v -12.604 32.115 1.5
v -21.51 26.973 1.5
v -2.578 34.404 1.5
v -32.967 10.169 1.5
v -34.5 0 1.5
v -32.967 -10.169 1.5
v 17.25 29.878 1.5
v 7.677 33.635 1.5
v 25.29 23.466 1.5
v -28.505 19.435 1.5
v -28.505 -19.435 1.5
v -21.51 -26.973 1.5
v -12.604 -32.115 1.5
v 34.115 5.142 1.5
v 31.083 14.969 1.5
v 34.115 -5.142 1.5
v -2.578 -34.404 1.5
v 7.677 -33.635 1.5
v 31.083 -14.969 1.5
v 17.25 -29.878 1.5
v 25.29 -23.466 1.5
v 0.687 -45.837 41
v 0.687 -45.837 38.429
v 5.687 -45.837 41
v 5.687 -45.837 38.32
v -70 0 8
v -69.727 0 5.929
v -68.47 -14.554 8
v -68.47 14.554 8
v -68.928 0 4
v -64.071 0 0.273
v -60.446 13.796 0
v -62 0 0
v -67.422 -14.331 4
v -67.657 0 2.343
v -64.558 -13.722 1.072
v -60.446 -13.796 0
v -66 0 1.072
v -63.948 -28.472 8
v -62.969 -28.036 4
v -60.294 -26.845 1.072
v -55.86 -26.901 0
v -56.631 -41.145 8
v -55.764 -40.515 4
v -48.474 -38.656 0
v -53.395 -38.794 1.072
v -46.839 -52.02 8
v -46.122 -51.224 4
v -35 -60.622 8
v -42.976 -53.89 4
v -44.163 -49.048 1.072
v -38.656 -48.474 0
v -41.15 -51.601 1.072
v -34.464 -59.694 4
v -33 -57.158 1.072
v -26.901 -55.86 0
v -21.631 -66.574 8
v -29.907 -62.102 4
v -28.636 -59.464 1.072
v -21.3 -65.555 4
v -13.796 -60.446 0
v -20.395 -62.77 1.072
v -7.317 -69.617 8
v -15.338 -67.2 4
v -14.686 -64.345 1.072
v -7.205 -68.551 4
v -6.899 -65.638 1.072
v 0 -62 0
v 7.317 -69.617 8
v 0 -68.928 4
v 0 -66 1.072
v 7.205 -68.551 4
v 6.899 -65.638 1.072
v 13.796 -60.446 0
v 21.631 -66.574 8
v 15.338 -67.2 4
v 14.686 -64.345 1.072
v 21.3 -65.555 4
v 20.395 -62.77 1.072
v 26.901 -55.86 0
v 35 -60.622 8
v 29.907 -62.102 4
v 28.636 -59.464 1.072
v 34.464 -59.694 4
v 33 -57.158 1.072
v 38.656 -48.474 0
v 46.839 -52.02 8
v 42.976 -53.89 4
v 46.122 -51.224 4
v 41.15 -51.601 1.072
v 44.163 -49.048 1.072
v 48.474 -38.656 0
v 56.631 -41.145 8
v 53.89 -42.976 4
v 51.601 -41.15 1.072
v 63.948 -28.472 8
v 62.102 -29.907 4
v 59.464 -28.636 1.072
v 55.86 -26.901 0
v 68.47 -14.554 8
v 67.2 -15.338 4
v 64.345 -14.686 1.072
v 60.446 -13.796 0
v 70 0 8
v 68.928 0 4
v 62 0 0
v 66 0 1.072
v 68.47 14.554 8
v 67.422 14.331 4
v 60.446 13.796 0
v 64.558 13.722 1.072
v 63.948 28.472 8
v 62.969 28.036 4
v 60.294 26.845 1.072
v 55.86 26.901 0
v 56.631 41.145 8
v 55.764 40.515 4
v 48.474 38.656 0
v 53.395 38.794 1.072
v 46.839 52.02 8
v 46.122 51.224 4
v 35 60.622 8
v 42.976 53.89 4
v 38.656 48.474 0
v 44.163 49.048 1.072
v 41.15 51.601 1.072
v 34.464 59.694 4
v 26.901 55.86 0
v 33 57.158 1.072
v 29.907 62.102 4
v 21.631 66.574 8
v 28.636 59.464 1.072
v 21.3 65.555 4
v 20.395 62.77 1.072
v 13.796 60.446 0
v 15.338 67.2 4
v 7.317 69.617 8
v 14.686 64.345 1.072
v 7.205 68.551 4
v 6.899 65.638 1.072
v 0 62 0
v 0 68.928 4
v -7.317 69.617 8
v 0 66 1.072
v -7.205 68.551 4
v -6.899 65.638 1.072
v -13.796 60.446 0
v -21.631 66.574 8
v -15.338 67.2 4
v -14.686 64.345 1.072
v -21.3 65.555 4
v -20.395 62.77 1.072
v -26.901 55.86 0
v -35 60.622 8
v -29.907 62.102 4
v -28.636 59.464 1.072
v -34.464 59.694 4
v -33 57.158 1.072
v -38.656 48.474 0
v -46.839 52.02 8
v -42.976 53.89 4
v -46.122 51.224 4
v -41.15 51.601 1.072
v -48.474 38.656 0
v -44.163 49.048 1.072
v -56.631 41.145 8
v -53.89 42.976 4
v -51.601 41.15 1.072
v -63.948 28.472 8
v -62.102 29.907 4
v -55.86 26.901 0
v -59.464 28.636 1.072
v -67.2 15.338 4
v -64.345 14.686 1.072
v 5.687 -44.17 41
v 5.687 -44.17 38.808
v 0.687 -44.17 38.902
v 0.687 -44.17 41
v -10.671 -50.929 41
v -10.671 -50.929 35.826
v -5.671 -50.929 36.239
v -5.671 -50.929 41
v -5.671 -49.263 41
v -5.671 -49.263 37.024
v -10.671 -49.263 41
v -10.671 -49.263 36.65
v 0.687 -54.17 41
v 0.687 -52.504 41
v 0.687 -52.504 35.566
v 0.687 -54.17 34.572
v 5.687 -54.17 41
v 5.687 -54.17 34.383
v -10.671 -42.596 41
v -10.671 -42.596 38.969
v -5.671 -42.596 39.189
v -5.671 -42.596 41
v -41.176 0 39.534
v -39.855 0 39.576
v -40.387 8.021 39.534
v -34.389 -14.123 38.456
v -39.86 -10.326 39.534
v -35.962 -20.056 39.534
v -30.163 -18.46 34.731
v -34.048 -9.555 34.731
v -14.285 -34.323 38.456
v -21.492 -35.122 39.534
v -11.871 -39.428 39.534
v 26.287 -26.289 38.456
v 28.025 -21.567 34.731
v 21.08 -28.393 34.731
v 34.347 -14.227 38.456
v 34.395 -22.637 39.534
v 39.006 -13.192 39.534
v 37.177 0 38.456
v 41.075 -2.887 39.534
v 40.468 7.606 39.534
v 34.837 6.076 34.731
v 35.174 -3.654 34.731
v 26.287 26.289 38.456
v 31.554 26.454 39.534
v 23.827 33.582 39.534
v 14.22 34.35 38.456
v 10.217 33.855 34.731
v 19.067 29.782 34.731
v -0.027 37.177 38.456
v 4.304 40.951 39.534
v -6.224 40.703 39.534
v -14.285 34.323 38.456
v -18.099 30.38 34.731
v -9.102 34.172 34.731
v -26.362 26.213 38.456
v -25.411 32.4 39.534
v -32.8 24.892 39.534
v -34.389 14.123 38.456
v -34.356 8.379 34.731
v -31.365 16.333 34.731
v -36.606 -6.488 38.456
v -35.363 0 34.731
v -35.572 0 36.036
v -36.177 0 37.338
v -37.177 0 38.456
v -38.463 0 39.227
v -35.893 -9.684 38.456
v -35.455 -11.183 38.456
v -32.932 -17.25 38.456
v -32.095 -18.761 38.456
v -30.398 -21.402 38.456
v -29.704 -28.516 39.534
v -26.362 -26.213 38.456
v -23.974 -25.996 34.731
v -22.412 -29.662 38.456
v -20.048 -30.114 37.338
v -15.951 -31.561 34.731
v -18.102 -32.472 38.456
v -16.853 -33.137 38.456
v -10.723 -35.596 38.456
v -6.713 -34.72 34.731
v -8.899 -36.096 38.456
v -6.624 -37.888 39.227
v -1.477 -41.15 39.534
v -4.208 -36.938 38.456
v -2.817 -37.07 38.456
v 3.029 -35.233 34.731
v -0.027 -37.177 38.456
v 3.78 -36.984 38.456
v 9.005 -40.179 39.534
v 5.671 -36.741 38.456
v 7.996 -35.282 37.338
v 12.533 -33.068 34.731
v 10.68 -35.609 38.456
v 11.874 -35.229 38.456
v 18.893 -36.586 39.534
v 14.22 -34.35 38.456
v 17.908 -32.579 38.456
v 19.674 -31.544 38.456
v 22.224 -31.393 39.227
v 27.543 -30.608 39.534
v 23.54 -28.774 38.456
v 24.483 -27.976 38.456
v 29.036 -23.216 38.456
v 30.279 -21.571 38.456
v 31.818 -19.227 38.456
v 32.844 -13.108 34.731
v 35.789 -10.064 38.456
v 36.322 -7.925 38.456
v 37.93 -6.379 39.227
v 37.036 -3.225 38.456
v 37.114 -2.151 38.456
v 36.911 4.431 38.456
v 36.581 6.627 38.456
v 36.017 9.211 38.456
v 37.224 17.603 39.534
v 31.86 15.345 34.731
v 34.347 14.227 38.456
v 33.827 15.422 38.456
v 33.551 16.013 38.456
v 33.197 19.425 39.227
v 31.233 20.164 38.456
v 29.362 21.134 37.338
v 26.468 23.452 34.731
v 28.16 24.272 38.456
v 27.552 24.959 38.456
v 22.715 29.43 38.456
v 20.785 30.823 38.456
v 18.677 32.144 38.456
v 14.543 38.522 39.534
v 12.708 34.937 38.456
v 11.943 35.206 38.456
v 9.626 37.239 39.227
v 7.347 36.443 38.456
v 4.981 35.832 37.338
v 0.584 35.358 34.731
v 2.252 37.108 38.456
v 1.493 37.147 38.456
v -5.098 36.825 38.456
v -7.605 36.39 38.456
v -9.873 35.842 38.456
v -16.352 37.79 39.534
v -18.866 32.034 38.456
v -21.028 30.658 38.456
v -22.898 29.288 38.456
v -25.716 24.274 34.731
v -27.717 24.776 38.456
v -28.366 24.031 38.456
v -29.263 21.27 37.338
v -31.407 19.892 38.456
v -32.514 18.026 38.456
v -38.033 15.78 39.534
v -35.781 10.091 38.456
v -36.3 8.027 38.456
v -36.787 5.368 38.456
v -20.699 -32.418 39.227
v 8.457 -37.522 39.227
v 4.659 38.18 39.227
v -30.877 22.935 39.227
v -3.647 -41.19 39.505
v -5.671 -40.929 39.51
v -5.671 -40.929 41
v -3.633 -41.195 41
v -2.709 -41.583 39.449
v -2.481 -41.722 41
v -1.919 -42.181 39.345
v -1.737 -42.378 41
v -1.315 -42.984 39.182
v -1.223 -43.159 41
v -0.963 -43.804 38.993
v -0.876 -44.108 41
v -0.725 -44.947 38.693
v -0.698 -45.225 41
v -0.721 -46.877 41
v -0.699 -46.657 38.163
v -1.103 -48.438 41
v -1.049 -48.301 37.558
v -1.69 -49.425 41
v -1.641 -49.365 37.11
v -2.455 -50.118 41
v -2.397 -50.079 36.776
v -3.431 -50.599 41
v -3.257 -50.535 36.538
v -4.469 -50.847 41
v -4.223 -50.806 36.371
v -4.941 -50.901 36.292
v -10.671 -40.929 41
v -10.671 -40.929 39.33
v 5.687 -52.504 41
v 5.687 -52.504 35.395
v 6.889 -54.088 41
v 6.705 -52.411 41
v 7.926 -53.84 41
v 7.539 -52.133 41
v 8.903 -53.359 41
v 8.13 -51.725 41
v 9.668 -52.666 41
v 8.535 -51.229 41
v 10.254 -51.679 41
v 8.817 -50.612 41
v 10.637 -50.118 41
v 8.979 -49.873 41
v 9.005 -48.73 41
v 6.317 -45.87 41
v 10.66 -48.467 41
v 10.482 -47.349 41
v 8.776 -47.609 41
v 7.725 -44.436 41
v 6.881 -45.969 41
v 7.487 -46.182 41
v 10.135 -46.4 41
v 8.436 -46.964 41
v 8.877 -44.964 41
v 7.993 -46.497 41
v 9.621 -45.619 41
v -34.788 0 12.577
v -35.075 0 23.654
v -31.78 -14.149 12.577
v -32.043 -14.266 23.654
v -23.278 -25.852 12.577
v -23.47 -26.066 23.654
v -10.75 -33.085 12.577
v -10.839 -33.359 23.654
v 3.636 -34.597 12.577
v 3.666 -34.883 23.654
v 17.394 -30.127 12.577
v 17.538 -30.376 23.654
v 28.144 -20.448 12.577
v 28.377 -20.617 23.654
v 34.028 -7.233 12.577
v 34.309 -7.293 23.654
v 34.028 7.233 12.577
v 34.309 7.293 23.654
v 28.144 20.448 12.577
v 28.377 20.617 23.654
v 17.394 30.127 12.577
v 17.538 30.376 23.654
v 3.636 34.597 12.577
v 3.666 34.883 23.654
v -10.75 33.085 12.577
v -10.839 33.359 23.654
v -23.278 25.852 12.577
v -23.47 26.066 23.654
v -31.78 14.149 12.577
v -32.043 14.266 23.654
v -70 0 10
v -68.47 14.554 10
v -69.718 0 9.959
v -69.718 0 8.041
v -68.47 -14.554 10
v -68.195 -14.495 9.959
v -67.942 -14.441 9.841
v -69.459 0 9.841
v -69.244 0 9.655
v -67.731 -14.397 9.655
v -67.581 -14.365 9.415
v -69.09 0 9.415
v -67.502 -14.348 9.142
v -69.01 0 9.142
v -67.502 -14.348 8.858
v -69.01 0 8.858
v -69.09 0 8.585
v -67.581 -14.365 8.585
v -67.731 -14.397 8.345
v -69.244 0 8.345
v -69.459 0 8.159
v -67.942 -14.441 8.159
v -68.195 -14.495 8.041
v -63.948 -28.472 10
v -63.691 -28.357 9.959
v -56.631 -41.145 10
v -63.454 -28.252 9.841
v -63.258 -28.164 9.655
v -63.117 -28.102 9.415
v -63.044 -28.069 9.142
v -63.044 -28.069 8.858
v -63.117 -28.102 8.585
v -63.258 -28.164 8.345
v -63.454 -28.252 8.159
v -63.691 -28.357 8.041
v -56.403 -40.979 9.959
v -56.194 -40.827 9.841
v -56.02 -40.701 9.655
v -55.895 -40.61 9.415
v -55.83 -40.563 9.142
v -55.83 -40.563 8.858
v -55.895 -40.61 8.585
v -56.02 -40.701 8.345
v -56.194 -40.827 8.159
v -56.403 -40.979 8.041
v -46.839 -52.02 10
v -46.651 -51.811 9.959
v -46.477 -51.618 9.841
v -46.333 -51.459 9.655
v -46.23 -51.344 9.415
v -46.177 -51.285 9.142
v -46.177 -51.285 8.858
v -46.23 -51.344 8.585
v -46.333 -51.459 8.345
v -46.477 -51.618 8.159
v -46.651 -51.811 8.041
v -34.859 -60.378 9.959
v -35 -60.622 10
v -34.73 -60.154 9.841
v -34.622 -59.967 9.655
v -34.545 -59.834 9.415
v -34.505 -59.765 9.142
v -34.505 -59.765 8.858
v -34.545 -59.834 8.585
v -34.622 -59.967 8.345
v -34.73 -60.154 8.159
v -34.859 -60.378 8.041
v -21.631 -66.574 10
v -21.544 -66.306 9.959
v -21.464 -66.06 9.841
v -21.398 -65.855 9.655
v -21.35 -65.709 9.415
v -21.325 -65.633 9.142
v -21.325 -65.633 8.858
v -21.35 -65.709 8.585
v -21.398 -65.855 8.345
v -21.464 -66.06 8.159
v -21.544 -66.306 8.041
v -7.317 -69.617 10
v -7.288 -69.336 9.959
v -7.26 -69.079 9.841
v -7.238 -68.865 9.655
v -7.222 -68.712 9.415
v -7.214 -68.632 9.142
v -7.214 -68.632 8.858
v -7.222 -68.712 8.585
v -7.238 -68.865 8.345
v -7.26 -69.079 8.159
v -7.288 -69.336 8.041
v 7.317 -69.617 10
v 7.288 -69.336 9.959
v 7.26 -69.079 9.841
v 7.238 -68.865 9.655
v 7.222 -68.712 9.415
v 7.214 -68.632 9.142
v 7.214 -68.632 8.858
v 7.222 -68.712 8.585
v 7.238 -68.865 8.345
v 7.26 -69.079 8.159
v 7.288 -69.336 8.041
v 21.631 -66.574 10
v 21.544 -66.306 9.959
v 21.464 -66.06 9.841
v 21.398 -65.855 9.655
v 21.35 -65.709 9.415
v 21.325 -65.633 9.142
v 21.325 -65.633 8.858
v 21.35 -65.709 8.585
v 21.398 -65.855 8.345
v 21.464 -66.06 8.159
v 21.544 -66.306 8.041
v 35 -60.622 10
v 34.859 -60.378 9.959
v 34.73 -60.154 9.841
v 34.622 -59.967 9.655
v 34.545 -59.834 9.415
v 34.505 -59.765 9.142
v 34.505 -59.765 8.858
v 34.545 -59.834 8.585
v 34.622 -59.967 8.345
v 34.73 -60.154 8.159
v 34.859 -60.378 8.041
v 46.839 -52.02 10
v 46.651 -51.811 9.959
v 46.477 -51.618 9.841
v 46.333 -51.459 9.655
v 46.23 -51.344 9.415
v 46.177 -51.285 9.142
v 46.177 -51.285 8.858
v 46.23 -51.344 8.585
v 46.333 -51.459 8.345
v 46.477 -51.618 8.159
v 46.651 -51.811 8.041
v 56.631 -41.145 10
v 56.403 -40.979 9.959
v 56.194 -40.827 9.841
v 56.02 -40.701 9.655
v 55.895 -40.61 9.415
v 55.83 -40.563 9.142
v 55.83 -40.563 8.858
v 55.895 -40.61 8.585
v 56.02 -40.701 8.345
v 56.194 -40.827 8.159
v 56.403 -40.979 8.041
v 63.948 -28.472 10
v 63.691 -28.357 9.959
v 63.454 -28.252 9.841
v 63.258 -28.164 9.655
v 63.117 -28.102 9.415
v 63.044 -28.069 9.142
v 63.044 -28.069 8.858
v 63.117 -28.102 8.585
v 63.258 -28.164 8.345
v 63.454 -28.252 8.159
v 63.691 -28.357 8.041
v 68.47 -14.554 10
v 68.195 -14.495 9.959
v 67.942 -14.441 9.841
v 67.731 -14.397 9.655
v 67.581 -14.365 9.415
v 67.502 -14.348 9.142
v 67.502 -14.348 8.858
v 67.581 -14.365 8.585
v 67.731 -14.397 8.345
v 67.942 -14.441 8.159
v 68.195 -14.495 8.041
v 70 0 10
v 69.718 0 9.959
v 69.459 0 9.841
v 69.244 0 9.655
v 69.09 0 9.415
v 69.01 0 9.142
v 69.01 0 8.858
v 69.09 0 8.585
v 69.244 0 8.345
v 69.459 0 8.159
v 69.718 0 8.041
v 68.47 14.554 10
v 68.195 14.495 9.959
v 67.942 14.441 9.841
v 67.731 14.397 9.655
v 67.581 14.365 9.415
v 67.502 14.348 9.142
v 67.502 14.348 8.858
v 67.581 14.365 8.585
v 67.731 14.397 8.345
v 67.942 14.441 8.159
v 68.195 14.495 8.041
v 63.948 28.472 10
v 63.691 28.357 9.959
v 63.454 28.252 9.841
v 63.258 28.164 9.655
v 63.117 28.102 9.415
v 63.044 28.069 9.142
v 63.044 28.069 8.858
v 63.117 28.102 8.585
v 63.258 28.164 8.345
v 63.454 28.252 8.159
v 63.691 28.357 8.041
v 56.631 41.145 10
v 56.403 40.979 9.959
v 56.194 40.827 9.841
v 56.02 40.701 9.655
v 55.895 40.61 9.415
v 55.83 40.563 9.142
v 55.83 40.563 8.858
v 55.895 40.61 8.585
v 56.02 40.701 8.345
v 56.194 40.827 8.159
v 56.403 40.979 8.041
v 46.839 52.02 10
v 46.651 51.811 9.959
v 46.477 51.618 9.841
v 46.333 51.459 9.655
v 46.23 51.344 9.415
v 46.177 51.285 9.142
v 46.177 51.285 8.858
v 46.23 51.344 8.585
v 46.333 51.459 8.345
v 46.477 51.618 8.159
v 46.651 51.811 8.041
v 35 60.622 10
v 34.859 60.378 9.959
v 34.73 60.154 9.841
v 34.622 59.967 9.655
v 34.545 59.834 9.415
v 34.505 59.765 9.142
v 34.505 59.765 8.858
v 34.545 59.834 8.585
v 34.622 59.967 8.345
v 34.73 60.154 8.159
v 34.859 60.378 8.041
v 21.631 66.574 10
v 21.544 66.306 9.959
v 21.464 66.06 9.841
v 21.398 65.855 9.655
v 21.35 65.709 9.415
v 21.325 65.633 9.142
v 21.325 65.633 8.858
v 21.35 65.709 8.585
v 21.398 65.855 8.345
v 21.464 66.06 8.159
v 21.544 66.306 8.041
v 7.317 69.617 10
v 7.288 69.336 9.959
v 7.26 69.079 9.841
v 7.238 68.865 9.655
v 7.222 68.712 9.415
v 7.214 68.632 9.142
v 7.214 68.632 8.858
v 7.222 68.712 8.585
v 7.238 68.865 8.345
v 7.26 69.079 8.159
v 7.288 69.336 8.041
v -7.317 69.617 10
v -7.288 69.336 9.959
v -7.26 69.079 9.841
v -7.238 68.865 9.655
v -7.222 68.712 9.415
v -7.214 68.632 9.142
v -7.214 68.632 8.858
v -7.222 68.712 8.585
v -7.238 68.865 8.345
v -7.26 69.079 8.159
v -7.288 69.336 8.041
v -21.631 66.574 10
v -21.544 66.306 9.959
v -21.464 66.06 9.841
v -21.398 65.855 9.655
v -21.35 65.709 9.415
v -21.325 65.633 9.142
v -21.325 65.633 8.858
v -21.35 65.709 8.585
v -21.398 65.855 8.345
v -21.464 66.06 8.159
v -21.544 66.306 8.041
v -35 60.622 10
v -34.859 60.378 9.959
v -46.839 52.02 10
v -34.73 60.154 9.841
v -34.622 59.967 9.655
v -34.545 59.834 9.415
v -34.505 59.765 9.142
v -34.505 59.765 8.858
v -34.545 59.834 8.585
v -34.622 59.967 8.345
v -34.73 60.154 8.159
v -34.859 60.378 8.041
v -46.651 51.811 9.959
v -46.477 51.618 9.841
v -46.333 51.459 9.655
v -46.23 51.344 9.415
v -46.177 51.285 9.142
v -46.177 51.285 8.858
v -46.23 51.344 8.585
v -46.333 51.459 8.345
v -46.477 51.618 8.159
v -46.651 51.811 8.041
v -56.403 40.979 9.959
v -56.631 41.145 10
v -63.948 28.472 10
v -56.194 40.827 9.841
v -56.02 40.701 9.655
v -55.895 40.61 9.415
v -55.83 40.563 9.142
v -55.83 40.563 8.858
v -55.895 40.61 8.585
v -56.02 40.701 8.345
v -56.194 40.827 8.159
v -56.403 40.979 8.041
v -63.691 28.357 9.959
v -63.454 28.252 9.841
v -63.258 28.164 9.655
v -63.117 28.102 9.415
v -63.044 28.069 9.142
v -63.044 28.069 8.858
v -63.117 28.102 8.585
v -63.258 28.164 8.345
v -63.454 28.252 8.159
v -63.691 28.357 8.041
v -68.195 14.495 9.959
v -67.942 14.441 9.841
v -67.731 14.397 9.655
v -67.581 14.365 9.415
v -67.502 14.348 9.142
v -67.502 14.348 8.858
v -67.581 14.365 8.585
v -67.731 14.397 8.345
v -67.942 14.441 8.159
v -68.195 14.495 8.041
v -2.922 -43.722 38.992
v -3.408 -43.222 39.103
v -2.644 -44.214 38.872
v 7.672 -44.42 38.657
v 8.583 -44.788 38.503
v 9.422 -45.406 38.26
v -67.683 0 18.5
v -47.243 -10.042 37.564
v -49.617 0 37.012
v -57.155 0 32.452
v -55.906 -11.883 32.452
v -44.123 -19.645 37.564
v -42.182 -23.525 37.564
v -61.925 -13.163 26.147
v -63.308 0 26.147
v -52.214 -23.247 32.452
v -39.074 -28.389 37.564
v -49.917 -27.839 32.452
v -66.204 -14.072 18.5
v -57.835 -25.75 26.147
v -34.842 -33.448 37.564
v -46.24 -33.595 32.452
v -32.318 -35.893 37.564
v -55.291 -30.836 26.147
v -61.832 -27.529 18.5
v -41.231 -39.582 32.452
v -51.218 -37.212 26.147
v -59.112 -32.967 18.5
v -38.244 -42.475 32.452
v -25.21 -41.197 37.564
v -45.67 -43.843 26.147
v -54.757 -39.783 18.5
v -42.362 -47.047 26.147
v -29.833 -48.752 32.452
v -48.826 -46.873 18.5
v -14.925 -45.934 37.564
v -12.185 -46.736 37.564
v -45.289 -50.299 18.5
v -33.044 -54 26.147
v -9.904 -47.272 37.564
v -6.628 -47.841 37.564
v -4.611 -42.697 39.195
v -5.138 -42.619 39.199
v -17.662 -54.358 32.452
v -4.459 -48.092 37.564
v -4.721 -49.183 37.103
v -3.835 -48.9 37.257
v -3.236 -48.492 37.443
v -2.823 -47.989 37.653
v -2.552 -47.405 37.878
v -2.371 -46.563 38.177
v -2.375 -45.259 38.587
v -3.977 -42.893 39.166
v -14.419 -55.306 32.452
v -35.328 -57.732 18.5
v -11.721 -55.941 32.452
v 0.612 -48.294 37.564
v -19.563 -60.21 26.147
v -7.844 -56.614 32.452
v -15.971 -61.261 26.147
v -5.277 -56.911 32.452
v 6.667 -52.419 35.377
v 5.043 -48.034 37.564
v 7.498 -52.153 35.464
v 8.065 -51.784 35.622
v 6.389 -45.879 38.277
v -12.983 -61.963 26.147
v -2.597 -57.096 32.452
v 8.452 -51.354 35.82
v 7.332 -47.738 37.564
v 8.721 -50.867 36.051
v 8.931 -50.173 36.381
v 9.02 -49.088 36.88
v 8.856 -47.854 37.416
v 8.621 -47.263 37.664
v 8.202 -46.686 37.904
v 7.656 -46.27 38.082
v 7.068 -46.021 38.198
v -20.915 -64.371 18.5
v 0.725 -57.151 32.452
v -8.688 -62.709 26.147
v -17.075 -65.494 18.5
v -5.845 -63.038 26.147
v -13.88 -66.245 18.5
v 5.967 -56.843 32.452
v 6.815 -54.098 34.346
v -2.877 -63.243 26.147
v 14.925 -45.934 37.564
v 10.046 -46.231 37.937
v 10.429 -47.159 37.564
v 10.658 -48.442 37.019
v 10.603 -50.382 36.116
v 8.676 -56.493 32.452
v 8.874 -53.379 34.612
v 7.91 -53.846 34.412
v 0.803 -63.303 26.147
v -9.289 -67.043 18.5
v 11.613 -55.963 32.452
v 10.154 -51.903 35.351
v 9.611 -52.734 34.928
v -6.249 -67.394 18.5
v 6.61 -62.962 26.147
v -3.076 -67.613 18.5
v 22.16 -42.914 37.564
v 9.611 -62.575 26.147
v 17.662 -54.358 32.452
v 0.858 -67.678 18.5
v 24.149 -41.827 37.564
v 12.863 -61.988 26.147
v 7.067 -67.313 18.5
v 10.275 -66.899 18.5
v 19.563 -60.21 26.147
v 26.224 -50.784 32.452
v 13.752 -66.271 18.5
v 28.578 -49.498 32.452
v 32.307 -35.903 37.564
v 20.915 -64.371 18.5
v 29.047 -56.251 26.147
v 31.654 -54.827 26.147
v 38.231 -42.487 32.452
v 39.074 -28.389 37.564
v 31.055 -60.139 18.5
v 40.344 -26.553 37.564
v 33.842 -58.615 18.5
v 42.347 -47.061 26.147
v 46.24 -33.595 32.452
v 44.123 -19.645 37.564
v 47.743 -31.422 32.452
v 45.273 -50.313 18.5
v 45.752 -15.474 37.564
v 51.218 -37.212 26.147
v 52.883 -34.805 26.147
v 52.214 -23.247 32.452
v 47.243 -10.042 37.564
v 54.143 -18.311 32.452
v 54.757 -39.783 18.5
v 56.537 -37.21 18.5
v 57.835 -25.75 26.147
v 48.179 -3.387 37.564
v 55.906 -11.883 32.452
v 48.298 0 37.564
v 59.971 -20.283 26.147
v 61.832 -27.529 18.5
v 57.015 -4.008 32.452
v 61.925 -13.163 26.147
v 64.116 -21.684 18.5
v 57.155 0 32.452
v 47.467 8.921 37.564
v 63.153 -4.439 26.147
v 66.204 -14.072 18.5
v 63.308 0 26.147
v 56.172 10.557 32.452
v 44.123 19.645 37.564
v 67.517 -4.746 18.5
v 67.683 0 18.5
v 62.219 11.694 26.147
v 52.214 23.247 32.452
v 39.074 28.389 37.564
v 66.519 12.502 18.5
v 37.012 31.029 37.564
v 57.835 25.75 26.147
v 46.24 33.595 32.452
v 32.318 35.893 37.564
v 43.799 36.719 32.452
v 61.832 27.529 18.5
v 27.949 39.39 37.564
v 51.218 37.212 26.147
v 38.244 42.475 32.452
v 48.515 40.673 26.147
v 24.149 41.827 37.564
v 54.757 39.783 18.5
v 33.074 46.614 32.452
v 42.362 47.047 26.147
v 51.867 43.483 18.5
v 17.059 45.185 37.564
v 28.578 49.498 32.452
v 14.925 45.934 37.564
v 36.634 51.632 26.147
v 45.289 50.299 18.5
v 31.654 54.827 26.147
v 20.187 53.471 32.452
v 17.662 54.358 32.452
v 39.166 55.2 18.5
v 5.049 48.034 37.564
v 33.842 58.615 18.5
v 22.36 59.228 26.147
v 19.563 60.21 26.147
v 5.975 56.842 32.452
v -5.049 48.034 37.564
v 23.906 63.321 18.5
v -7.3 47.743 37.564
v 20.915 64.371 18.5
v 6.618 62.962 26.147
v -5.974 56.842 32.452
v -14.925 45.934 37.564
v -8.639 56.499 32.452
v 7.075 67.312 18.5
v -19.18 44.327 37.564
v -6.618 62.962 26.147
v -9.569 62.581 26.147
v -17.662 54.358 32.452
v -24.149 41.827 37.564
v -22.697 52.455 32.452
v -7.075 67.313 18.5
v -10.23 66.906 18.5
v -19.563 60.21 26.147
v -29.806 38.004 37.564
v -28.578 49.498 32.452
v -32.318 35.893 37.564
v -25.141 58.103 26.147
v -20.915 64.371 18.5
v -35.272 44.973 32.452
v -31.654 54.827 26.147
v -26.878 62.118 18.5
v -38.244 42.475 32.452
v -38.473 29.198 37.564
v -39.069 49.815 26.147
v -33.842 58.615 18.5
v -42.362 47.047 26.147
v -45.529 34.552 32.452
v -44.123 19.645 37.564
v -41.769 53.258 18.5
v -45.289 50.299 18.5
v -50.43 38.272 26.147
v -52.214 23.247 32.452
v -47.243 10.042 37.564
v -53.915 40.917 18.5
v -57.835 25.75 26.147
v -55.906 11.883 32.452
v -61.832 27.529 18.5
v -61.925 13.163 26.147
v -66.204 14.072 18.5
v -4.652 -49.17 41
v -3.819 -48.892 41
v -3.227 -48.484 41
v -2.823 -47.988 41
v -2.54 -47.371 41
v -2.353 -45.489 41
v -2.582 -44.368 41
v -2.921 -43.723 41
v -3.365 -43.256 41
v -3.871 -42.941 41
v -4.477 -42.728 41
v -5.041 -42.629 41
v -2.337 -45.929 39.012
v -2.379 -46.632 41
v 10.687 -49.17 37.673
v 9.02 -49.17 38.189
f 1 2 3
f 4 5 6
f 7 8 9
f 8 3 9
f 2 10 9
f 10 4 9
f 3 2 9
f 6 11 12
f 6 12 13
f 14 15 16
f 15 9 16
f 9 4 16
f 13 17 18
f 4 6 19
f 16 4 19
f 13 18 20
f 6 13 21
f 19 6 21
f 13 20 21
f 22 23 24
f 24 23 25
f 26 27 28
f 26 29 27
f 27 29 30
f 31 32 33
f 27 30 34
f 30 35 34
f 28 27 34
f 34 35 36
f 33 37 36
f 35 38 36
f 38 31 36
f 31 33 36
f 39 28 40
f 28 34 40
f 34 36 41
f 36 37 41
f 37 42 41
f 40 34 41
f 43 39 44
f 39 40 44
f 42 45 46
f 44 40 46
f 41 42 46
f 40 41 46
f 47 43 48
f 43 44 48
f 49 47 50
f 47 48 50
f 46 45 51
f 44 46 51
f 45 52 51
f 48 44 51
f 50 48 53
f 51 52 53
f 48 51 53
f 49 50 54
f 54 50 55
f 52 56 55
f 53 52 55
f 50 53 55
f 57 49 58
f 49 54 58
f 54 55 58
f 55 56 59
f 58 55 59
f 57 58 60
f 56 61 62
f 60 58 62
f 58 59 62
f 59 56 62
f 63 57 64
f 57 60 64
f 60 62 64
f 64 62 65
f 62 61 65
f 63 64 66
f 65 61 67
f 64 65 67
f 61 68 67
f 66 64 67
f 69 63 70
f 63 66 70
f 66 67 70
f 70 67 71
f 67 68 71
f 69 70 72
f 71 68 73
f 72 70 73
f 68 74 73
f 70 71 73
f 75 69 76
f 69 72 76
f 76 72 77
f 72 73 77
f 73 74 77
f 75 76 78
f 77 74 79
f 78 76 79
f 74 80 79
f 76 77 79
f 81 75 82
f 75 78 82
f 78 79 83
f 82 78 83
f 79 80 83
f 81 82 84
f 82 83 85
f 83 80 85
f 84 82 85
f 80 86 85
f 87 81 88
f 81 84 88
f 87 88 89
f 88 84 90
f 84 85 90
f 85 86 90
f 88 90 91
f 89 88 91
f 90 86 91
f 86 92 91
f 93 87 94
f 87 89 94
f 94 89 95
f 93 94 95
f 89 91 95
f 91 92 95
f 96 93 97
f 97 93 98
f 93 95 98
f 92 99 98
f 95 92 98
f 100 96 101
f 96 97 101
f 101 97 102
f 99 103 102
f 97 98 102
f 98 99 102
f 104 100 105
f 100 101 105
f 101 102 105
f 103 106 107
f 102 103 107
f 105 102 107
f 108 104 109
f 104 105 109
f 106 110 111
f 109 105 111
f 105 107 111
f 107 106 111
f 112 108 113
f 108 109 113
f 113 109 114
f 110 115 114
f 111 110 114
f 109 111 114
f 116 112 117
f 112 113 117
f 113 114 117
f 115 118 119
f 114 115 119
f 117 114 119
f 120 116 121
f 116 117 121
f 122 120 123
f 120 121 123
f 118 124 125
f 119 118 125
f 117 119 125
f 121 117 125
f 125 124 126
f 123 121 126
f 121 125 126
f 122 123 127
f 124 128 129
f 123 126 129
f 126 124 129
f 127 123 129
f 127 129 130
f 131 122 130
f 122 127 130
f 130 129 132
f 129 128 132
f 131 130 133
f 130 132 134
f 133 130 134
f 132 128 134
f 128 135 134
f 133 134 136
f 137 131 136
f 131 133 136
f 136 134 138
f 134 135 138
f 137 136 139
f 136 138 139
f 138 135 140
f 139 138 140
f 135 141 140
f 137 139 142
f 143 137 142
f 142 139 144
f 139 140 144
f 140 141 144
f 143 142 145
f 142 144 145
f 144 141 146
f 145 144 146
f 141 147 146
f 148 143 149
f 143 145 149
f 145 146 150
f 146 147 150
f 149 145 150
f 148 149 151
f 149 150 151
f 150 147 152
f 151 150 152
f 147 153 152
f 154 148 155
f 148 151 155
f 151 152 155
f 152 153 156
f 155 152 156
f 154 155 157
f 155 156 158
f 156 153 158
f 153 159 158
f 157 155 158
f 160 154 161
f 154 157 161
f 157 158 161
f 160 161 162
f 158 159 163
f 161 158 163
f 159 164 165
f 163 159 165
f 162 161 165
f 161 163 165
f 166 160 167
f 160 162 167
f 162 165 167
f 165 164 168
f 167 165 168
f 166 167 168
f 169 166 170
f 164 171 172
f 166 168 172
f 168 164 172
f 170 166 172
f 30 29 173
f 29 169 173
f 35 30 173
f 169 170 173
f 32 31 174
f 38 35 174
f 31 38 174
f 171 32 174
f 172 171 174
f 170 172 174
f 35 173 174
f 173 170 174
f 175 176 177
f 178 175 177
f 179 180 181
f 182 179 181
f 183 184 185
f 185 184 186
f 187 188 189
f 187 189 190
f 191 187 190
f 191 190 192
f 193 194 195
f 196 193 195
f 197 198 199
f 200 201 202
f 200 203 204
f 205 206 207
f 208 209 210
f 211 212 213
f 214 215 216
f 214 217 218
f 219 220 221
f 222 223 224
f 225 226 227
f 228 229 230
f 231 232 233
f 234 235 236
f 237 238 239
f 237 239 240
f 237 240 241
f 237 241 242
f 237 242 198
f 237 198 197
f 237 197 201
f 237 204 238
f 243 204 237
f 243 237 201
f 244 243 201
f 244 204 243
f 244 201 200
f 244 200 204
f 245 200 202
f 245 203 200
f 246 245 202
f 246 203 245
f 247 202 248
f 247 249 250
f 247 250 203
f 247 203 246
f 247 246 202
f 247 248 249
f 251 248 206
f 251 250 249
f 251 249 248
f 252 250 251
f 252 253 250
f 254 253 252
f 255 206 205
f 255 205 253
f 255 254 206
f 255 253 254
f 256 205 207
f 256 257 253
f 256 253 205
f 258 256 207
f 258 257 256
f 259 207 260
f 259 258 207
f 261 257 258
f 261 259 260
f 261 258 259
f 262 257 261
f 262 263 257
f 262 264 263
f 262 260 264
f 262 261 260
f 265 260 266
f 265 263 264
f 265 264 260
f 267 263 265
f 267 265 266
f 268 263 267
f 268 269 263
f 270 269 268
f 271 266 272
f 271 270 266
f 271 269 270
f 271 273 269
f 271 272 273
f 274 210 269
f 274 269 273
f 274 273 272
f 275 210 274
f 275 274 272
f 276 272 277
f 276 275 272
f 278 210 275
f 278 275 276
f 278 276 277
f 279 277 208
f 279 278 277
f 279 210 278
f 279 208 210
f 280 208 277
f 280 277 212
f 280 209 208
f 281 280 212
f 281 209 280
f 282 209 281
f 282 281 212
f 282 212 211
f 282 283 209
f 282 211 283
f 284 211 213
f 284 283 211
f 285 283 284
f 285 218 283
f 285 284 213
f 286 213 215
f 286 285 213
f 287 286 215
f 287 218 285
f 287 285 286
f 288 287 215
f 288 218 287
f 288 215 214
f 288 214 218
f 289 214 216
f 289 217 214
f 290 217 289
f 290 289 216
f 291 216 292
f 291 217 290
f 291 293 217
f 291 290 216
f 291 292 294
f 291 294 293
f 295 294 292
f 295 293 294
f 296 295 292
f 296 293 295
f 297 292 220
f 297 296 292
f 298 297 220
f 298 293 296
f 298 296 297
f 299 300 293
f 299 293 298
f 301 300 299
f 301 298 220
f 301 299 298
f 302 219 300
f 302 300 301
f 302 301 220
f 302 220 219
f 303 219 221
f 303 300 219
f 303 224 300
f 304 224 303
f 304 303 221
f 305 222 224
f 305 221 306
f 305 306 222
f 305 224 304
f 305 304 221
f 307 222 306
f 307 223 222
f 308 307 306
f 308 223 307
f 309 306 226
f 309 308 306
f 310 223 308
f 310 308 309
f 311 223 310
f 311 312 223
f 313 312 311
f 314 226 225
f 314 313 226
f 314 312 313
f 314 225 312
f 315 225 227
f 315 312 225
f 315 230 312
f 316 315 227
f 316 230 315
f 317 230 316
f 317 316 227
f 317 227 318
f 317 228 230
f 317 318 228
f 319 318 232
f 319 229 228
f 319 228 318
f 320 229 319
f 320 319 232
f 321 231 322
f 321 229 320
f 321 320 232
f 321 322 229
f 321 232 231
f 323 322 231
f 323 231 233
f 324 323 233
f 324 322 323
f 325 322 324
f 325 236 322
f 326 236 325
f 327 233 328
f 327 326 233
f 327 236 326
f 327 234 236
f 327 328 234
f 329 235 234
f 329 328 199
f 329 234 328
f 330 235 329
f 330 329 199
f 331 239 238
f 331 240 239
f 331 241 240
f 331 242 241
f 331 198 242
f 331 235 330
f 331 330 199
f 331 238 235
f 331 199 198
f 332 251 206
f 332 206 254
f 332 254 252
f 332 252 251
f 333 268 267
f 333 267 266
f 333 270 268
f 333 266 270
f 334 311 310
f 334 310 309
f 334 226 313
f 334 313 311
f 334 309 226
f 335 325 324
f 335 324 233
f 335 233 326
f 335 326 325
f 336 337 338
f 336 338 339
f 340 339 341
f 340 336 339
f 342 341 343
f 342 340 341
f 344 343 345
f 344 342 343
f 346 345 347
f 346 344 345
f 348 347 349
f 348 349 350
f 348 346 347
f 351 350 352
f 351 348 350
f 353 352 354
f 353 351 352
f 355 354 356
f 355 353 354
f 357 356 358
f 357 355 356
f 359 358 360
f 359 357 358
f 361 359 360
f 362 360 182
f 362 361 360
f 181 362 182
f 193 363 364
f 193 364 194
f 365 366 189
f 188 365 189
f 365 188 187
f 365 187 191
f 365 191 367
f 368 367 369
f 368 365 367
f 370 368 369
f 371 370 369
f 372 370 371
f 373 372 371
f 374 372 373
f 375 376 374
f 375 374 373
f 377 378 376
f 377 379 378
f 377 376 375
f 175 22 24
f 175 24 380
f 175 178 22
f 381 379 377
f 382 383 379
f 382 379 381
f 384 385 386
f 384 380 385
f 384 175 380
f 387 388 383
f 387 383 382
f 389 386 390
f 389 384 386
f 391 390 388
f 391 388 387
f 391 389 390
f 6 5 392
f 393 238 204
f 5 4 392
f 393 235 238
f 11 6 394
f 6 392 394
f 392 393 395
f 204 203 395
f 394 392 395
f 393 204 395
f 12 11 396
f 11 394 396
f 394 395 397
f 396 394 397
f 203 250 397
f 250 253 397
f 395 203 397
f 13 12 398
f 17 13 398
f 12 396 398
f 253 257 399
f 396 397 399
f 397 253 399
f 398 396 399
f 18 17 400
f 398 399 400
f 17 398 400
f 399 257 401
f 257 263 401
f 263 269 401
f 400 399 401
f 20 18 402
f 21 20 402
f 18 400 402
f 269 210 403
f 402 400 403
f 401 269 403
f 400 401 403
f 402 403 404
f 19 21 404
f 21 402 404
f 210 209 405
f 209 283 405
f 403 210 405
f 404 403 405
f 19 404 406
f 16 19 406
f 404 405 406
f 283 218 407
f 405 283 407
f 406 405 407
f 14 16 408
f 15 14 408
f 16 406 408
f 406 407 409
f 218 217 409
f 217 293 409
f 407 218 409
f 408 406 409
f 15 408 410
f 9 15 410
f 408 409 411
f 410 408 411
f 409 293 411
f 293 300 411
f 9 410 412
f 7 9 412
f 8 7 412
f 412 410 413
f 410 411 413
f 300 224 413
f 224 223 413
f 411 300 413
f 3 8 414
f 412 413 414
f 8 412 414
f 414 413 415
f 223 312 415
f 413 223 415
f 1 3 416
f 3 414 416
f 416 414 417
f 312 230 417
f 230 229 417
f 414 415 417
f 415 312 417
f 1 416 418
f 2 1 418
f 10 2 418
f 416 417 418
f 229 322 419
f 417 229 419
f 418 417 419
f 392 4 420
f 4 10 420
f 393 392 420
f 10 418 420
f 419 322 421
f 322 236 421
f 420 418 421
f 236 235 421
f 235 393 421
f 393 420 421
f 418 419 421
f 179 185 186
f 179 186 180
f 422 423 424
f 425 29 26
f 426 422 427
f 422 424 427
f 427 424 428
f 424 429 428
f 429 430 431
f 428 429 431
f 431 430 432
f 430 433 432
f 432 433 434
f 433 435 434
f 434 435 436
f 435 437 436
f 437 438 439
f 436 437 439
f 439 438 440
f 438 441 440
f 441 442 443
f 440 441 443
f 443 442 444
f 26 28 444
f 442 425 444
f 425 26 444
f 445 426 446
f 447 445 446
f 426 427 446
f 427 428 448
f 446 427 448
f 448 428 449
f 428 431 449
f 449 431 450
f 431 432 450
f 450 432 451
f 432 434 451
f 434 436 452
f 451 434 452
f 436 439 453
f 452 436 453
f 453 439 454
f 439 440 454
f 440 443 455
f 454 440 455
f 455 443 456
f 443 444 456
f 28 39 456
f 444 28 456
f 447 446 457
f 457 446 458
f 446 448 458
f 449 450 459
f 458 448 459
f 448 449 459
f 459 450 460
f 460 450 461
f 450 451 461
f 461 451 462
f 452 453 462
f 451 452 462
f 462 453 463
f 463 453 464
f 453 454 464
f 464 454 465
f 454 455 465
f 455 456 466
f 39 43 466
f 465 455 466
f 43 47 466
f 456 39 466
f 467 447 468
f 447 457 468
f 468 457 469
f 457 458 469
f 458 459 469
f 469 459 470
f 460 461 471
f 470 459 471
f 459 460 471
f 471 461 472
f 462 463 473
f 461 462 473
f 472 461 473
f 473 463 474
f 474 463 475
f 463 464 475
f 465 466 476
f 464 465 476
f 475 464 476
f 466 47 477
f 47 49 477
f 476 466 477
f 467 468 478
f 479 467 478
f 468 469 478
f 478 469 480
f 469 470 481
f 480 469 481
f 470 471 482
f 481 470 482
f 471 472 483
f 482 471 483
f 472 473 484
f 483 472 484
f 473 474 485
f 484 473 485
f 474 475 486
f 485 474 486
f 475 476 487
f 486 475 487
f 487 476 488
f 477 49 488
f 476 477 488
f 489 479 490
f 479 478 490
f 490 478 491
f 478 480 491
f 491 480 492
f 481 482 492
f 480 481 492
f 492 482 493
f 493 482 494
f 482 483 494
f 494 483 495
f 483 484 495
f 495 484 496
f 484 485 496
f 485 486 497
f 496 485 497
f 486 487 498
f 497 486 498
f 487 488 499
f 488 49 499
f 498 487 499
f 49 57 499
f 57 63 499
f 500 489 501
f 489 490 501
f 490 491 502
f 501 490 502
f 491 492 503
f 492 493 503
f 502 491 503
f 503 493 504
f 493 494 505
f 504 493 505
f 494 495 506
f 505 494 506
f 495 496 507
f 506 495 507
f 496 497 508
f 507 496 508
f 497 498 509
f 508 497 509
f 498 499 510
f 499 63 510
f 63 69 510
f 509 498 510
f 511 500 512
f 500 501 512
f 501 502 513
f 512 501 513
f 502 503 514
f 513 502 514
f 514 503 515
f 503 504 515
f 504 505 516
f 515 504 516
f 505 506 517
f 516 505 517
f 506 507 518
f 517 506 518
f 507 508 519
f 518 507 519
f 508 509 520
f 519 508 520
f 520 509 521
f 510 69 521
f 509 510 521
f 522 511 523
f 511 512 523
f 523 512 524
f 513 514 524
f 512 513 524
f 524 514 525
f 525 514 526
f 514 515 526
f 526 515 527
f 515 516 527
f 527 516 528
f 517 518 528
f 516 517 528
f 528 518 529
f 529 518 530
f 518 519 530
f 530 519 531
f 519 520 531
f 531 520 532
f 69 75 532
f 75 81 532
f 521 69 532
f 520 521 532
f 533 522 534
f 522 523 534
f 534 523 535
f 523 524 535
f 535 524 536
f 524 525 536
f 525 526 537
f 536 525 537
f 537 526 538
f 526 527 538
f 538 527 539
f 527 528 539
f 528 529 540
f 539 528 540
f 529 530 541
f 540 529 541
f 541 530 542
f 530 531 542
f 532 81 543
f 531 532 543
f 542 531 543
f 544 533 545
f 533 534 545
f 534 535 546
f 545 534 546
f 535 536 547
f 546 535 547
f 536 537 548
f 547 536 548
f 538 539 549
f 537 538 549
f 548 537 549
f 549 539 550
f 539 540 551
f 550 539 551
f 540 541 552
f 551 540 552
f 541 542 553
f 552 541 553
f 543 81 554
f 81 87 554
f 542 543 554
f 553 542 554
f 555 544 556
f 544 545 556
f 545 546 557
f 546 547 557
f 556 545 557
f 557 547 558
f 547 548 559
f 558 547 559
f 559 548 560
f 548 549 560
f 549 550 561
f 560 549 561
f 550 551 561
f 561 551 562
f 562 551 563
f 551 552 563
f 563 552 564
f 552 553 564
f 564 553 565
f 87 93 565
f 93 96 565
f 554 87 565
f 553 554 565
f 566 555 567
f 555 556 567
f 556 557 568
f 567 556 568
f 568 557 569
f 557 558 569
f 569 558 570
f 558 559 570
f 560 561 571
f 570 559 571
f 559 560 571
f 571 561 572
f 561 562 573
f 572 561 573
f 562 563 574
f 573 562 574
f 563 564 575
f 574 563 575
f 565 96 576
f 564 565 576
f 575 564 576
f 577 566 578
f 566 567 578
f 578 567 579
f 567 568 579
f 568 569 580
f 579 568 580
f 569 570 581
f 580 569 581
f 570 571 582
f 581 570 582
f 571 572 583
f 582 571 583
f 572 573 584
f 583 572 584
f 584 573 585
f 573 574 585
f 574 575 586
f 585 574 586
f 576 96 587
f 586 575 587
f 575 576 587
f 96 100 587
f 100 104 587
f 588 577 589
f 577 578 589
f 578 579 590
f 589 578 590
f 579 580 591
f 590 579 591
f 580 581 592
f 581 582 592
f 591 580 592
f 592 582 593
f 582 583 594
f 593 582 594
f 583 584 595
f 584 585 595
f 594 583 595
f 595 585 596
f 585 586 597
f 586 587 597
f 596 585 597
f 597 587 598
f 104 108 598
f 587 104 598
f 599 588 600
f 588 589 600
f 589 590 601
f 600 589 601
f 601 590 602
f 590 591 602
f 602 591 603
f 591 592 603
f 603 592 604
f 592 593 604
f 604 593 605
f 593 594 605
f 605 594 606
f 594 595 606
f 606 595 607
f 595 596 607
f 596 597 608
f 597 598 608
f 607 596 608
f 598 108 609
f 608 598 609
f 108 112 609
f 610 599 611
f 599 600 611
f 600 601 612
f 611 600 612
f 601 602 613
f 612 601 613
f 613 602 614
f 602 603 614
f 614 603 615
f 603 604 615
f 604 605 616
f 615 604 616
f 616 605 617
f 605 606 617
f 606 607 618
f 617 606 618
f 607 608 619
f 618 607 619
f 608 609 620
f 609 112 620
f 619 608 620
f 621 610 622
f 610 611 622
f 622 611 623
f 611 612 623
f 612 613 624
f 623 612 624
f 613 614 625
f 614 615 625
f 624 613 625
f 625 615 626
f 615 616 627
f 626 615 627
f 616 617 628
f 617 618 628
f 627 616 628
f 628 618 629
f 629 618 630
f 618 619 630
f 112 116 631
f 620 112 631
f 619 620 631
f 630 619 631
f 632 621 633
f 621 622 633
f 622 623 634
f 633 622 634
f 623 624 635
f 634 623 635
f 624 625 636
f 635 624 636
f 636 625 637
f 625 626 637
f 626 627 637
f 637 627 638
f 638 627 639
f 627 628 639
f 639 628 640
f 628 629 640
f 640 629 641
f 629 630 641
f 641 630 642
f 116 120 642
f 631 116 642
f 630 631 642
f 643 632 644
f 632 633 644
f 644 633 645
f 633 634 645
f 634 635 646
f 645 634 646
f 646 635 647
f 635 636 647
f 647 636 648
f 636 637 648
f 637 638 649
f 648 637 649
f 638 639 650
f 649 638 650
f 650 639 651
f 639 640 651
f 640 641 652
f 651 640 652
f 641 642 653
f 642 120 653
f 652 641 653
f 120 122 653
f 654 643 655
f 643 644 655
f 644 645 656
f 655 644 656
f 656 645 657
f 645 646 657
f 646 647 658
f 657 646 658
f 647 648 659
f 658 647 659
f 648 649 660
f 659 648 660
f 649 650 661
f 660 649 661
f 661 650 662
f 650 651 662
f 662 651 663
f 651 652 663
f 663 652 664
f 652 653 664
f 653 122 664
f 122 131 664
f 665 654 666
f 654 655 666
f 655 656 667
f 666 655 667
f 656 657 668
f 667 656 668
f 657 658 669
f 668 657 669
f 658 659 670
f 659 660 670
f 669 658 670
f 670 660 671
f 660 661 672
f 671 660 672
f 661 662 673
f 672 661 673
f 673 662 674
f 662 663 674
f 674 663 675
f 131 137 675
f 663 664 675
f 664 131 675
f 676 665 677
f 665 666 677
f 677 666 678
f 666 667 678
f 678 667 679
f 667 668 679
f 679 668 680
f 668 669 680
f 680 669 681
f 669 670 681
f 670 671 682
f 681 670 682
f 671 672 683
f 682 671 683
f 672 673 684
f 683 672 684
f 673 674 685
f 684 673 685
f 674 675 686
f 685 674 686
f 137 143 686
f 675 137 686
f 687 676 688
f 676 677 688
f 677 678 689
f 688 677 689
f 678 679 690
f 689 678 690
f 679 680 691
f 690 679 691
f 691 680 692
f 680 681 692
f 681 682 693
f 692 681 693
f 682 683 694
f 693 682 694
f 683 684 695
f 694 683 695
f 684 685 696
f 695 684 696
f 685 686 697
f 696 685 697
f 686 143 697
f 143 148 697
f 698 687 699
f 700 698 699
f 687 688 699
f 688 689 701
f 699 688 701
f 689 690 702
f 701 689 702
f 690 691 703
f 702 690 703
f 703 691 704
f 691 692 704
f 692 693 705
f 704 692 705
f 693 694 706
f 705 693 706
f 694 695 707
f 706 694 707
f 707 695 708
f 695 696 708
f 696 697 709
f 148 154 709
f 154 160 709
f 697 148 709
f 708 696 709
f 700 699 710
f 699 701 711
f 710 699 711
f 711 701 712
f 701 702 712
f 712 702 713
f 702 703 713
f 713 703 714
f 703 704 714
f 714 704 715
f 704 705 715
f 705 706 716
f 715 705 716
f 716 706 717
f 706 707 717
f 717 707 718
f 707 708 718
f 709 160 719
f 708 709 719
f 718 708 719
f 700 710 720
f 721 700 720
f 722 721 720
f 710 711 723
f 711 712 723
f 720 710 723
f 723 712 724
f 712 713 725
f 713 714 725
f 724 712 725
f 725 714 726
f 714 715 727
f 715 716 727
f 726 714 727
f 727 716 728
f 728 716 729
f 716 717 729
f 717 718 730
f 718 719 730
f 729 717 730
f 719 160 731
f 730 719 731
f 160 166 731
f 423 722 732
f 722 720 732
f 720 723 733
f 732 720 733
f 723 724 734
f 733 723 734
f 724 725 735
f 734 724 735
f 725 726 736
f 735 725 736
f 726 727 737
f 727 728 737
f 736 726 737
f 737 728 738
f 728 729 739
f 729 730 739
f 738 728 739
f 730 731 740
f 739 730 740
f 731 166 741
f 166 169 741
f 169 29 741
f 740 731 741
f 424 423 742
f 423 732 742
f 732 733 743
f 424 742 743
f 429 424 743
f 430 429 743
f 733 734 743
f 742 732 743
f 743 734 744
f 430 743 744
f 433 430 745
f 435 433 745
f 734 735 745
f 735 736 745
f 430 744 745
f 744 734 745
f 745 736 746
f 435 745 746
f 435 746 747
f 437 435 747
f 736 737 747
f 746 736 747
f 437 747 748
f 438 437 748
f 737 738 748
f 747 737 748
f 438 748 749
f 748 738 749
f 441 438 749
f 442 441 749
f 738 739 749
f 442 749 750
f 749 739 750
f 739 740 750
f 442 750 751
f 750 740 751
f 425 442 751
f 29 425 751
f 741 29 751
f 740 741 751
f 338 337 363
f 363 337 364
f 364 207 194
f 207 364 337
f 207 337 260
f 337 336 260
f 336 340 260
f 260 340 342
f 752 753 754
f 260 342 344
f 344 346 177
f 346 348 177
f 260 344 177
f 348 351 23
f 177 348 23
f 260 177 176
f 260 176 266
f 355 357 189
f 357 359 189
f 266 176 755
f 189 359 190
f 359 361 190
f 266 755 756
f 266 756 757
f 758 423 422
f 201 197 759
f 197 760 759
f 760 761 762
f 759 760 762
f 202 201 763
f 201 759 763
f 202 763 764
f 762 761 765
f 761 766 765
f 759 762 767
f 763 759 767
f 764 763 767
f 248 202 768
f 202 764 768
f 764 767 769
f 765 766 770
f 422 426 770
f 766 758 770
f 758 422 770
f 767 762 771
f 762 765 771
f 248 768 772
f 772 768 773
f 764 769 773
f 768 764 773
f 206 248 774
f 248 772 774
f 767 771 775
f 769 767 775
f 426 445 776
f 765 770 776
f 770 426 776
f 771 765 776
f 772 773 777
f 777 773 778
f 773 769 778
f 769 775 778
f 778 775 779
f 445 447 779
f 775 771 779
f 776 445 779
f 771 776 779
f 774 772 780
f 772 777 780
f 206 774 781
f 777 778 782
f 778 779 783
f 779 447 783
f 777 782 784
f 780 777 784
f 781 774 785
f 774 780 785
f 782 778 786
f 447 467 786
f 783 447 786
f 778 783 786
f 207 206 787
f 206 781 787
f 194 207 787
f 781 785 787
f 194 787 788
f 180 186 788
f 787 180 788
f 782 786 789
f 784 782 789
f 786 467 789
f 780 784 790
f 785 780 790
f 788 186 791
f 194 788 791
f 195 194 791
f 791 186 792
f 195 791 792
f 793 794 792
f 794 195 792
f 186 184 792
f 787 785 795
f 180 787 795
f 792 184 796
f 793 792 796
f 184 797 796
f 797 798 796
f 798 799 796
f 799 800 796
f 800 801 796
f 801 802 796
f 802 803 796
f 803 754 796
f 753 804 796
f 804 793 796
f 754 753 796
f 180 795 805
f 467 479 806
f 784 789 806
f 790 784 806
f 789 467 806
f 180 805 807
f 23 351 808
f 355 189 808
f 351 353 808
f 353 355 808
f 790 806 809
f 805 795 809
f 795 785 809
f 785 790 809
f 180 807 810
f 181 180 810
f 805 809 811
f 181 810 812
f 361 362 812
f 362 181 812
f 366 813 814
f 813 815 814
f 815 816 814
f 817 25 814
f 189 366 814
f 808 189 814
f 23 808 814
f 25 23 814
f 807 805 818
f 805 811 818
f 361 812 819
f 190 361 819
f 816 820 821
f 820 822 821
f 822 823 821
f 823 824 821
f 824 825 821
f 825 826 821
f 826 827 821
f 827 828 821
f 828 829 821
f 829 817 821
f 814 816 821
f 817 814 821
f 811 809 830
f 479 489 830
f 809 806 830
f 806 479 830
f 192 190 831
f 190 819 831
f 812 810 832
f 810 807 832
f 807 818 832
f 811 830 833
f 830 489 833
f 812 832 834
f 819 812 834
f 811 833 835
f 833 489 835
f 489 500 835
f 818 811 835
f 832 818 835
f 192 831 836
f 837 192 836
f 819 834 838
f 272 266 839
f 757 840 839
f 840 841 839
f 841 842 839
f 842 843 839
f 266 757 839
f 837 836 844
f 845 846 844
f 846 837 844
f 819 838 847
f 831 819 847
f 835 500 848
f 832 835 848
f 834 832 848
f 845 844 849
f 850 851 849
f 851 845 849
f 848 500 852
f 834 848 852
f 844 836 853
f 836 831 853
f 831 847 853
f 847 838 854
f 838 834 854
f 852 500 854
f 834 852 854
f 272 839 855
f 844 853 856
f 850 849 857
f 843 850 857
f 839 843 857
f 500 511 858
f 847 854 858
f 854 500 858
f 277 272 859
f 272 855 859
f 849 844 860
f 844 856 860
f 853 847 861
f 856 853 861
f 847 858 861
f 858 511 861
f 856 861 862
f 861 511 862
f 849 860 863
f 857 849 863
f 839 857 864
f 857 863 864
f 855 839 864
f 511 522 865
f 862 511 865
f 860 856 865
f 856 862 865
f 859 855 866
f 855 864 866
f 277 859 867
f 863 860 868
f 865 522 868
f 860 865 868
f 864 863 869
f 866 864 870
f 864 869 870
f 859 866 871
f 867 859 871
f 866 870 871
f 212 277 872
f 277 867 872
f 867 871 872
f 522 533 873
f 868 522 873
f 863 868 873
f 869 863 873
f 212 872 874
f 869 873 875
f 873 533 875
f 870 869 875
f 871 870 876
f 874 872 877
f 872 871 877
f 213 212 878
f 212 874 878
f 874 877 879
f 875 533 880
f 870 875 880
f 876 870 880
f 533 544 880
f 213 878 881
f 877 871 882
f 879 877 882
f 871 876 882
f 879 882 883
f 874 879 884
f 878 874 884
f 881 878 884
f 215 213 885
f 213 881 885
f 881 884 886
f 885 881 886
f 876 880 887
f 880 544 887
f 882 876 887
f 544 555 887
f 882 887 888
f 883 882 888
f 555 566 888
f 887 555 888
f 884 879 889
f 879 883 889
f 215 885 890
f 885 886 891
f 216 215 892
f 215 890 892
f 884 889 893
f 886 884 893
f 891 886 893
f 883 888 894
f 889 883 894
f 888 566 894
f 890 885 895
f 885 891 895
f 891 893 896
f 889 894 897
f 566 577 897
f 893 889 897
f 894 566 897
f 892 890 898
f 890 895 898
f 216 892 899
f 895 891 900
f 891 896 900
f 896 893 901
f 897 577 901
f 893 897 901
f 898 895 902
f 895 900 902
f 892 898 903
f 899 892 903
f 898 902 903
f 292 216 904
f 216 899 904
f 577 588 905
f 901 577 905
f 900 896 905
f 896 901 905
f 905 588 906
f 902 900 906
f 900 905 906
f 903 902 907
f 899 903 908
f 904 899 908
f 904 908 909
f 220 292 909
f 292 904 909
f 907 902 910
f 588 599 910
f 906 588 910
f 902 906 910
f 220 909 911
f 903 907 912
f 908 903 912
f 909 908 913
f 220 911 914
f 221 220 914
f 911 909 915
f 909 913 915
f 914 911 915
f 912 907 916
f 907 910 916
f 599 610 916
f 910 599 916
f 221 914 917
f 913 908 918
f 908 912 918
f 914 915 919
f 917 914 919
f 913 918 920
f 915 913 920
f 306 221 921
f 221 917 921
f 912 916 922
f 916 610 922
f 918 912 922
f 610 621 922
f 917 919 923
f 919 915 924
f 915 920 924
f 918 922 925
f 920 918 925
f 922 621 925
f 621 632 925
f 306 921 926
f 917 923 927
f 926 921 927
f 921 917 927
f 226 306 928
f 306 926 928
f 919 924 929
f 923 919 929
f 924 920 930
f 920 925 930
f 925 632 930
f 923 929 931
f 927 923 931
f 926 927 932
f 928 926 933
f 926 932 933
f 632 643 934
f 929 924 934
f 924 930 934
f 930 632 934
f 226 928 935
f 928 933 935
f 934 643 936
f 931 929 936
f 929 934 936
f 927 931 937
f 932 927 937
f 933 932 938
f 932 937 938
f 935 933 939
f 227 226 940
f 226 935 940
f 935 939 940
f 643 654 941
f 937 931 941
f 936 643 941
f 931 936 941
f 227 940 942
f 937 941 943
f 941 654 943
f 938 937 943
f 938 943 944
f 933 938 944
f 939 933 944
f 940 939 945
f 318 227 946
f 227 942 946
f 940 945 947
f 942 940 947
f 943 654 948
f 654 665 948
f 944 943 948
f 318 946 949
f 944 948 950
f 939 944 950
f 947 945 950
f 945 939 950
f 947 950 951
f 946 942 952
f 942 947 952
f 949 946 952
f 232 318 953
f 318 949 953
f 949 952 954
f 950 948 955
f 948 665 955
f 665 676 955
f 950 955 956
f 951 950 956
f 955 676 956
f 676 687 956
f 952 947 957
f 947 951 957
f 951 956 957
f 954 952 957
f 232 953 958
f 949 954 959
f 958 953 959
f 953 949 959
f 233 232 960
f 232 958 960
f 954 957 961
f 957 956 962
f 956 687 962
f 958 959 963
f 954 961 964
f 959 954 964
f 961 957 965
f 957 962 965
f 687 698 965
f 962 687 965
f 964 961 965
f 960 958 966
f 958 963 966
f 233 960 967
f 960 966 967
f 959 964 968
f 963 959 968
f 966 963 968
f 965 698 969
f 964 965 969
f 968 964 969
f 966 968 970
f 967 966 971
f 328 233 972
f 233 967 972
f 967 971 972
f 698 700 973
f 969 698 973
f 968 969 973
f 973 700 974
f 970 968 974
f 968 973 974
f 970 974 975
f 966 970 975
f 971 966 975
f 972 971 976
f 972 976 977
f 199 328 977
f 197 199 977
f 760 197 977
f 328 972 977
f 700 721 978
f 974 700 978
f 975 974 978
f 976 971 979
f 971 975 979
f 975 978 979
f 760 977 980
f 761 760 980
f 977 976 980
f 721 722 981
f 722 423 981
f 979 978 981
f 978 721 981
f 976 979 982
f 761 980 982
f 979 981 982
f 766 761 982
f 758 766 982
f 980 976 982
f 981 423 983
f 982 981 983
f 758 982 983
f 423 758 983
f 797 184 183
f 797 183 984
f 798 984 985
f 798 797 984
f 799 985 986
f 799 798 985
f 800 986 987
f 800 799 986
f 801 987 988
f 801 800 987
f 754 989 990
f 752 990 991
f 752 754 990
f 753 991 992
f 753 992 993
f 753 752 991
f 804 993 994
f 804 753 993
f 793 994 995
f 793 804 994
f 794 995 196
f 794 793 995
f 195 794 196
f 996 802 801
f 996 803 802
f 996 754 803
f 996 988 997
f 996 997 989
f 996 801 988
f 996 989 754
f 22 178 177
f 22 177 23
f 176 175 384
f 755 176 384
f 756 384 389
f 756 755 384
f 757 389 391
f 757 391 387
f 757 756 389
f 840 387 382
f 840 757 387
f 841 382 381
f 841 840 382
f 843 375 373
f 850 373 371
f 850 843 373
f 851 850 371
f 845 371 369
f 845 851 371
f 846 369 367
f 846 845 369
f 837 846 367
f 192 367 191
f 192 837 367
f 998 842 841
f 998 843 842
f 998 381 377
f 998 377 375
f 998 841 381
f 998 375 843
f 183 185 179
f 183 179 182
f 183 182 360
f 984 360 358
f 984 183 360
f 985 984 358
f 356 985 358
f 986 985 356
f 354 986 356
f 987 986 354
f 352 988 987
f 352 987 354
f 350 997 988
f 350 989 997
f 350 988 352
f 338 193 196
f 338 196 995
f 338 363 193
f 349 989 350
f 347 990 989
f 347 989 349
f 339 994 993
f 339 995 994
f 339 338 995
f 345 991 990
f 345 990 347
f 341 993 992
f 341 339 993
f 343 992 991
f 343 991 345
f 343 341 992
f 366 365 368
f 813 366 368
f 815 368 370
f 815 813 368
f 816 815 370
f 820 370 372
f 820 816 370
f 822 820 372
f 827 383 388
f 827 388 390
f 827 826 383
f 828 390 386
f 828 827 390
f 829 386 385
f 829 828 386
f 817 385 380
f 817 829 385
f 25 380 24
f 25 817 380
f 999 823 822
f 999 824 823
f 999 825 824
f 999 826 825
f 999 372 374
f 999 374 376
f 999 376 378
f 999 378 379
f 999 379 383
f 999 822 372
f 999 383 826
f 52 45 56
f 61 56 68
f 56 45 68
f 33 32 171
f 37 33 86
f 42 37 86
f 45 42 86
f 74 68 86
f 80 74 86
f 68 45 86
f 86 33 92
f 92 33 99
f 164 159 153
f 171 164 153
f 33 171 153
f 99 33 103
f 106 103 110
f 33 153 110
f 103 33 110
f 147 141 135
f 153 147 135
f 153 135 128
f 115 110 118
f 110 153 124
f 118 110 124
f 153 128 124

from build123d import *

# Parameters (mm, degrees)
F2_R     = 5
F4_DEPTH = 41


with BuildPart() as f1:
    # F0 (on Front) → F1 (revolve)
    with BuildSketch(Plane.XZ):
        with BuildLine():
            Line((-62, 0), (0, 0))
            Line((0, 0), (0, 1.5))
            Line((0, 1.5), (-34.5, 1.5))
            Line((-34.5, 1.5), (-35.5, 40))
            ThreePointArc((-35.5, 40), (-58.3596259812, 31.4510698784), (-70, 10))
            ThreePointArc((-70, 10), (-69, 9), (-70, 8))
            ThreePointArc((-70, 8), (-67.6568542495, 2.3431457505), (-62, 0))
        make_face()
    revolve(axis=Axis((0, 0, 0.75), (0, 0, 1)))

    # F2
    f2_edges = [f1.edges().sort_by_distance(p)[0] for p in [
        (35.5, 0, 40),
    ]]
    fillet(f2_edges, radius=F2_R)

    # F3 (on Top) → F4 (join)
    with BuildSketch(Plane.XY):
        with BuildLine():
            Line((-10.670827581, -42.5959917847), (-5.6708272125, -42.5959917847))
            add(Edge.make_bspline(
                [(-2.3374943705, -45.9293253637), (-2.3374943705, -43.7071029777), (-3.4486055635, -42.5959917847), (-5.6708272125, -42.5959917847)],
                knots=[0, 0, 0, 0, 1, 1, 1, 1], degree=3))
            add(Edge.make_bspline(
                [(-5.6708272125, -49.2626582057), (-3.4486055635, -49.2626582057), (-2.3374943705, -48.1515470127), (-2.3374943705, -45.9293253637)],
                knots=[0, 0, 0, 0, 1, 1, 1, 1], degree=3))
            Line((-5.6708272125, -49.2626582057), (-10.670827581, -49.2626582057))
            Line((-10.670827581, -49.2626582057), (-10.670827581, -50.9293249952))
            Line((-10.670827581, -50.9293249952), (-5.6708272125, -50.9293249952))
            add(Edge.make_bspline(
                [(-0.670827581, -45.9293253637), (-0.670827581, -49.2626582057), (-2.3374943705, -50.9293249952), (-5.6708272125, -50.9293249952)],
                knots=[0, 0, 0, 0, 1, 1, 1, 1], degree=3))
            add(Edge.make_bspline(
                [(-5.6708272125, -40.9293249952), (-2.3374943705, -40.9293249952), (-0.670827581, -42.5959917847), (-0.670827581, -45.9293253637)],
                knots=[0, 0, 0, 0, 1, 1, 1, 1], degree=3))
            Line((-5.6708272125, -40.9293249952), (-10.670827581, -40.9293249952))
            Line((-10.670827581, -40.9293249952), (-10.670827581, -42.5959917847))
        make_face()
        with BuildLine():
            Line((0.6868453929, -45.8371023778), (5.6868457614, -45.8371023778))
            add(Edge.make_bspline(
                [(9.0201786034, -49.1704359568), (9.0201786034, -46.9482135708), (7.9090674104, -45.8371023778), (5.6868457614, -45.8371023778)],
                knots=[0, 0, 0, 0, 1, 1, 1, 1], degree=3))
            add(Edge.make_bspline(
                [(5.6868457614, -52.5037687988), (7.9090674104, -52.5037687988), (9.0201786034, -51.3926576058), (9.0201786034, -49.1704359568)],
                knots=[0, 0, 0, 0, 1, 1, 1, 1], degree=3))
            Line((5.6868457614, -52.5037687988), (0.6868453929, -52.5037687988))
            Line((0.6868453929, -52.5037687988), (0.6868453929, -54.1704355883))
            Line((0.6868453929, -54.1704355883), (5.6868457614, -54.1704355883))
            add(Edge.make_bspline(
                [(10.6868453929, -49.1704359568), (10.6868453929, -52.5037687988), (9.0201786034, -54.1704355883), (5.6868457614, -54.1704355883)],
                knots=[0, 0, 0, 0, 1, 1, 1, 1], degree=3))
            add(Edge.make_bspline(
                [(5.6868457614, -44.1704355883), (9.0201786034, -44.1704355883), (10.6868453929, -45.8371023778), (10.6868453929, -49.1704359568)],
                knots=[0, 0, 0, 0, 1, 1, 1, 1], degree=3))
            Line((5.6868457614, -44.1704355883), (0.6868453929, -44.1704355883))
            Line((0.6868453929, -44.1704355883), (0.6868453929, -45.8371023778))
        make_face()
    extrude(amount=F4_DEPTH)


solid = f1.part
